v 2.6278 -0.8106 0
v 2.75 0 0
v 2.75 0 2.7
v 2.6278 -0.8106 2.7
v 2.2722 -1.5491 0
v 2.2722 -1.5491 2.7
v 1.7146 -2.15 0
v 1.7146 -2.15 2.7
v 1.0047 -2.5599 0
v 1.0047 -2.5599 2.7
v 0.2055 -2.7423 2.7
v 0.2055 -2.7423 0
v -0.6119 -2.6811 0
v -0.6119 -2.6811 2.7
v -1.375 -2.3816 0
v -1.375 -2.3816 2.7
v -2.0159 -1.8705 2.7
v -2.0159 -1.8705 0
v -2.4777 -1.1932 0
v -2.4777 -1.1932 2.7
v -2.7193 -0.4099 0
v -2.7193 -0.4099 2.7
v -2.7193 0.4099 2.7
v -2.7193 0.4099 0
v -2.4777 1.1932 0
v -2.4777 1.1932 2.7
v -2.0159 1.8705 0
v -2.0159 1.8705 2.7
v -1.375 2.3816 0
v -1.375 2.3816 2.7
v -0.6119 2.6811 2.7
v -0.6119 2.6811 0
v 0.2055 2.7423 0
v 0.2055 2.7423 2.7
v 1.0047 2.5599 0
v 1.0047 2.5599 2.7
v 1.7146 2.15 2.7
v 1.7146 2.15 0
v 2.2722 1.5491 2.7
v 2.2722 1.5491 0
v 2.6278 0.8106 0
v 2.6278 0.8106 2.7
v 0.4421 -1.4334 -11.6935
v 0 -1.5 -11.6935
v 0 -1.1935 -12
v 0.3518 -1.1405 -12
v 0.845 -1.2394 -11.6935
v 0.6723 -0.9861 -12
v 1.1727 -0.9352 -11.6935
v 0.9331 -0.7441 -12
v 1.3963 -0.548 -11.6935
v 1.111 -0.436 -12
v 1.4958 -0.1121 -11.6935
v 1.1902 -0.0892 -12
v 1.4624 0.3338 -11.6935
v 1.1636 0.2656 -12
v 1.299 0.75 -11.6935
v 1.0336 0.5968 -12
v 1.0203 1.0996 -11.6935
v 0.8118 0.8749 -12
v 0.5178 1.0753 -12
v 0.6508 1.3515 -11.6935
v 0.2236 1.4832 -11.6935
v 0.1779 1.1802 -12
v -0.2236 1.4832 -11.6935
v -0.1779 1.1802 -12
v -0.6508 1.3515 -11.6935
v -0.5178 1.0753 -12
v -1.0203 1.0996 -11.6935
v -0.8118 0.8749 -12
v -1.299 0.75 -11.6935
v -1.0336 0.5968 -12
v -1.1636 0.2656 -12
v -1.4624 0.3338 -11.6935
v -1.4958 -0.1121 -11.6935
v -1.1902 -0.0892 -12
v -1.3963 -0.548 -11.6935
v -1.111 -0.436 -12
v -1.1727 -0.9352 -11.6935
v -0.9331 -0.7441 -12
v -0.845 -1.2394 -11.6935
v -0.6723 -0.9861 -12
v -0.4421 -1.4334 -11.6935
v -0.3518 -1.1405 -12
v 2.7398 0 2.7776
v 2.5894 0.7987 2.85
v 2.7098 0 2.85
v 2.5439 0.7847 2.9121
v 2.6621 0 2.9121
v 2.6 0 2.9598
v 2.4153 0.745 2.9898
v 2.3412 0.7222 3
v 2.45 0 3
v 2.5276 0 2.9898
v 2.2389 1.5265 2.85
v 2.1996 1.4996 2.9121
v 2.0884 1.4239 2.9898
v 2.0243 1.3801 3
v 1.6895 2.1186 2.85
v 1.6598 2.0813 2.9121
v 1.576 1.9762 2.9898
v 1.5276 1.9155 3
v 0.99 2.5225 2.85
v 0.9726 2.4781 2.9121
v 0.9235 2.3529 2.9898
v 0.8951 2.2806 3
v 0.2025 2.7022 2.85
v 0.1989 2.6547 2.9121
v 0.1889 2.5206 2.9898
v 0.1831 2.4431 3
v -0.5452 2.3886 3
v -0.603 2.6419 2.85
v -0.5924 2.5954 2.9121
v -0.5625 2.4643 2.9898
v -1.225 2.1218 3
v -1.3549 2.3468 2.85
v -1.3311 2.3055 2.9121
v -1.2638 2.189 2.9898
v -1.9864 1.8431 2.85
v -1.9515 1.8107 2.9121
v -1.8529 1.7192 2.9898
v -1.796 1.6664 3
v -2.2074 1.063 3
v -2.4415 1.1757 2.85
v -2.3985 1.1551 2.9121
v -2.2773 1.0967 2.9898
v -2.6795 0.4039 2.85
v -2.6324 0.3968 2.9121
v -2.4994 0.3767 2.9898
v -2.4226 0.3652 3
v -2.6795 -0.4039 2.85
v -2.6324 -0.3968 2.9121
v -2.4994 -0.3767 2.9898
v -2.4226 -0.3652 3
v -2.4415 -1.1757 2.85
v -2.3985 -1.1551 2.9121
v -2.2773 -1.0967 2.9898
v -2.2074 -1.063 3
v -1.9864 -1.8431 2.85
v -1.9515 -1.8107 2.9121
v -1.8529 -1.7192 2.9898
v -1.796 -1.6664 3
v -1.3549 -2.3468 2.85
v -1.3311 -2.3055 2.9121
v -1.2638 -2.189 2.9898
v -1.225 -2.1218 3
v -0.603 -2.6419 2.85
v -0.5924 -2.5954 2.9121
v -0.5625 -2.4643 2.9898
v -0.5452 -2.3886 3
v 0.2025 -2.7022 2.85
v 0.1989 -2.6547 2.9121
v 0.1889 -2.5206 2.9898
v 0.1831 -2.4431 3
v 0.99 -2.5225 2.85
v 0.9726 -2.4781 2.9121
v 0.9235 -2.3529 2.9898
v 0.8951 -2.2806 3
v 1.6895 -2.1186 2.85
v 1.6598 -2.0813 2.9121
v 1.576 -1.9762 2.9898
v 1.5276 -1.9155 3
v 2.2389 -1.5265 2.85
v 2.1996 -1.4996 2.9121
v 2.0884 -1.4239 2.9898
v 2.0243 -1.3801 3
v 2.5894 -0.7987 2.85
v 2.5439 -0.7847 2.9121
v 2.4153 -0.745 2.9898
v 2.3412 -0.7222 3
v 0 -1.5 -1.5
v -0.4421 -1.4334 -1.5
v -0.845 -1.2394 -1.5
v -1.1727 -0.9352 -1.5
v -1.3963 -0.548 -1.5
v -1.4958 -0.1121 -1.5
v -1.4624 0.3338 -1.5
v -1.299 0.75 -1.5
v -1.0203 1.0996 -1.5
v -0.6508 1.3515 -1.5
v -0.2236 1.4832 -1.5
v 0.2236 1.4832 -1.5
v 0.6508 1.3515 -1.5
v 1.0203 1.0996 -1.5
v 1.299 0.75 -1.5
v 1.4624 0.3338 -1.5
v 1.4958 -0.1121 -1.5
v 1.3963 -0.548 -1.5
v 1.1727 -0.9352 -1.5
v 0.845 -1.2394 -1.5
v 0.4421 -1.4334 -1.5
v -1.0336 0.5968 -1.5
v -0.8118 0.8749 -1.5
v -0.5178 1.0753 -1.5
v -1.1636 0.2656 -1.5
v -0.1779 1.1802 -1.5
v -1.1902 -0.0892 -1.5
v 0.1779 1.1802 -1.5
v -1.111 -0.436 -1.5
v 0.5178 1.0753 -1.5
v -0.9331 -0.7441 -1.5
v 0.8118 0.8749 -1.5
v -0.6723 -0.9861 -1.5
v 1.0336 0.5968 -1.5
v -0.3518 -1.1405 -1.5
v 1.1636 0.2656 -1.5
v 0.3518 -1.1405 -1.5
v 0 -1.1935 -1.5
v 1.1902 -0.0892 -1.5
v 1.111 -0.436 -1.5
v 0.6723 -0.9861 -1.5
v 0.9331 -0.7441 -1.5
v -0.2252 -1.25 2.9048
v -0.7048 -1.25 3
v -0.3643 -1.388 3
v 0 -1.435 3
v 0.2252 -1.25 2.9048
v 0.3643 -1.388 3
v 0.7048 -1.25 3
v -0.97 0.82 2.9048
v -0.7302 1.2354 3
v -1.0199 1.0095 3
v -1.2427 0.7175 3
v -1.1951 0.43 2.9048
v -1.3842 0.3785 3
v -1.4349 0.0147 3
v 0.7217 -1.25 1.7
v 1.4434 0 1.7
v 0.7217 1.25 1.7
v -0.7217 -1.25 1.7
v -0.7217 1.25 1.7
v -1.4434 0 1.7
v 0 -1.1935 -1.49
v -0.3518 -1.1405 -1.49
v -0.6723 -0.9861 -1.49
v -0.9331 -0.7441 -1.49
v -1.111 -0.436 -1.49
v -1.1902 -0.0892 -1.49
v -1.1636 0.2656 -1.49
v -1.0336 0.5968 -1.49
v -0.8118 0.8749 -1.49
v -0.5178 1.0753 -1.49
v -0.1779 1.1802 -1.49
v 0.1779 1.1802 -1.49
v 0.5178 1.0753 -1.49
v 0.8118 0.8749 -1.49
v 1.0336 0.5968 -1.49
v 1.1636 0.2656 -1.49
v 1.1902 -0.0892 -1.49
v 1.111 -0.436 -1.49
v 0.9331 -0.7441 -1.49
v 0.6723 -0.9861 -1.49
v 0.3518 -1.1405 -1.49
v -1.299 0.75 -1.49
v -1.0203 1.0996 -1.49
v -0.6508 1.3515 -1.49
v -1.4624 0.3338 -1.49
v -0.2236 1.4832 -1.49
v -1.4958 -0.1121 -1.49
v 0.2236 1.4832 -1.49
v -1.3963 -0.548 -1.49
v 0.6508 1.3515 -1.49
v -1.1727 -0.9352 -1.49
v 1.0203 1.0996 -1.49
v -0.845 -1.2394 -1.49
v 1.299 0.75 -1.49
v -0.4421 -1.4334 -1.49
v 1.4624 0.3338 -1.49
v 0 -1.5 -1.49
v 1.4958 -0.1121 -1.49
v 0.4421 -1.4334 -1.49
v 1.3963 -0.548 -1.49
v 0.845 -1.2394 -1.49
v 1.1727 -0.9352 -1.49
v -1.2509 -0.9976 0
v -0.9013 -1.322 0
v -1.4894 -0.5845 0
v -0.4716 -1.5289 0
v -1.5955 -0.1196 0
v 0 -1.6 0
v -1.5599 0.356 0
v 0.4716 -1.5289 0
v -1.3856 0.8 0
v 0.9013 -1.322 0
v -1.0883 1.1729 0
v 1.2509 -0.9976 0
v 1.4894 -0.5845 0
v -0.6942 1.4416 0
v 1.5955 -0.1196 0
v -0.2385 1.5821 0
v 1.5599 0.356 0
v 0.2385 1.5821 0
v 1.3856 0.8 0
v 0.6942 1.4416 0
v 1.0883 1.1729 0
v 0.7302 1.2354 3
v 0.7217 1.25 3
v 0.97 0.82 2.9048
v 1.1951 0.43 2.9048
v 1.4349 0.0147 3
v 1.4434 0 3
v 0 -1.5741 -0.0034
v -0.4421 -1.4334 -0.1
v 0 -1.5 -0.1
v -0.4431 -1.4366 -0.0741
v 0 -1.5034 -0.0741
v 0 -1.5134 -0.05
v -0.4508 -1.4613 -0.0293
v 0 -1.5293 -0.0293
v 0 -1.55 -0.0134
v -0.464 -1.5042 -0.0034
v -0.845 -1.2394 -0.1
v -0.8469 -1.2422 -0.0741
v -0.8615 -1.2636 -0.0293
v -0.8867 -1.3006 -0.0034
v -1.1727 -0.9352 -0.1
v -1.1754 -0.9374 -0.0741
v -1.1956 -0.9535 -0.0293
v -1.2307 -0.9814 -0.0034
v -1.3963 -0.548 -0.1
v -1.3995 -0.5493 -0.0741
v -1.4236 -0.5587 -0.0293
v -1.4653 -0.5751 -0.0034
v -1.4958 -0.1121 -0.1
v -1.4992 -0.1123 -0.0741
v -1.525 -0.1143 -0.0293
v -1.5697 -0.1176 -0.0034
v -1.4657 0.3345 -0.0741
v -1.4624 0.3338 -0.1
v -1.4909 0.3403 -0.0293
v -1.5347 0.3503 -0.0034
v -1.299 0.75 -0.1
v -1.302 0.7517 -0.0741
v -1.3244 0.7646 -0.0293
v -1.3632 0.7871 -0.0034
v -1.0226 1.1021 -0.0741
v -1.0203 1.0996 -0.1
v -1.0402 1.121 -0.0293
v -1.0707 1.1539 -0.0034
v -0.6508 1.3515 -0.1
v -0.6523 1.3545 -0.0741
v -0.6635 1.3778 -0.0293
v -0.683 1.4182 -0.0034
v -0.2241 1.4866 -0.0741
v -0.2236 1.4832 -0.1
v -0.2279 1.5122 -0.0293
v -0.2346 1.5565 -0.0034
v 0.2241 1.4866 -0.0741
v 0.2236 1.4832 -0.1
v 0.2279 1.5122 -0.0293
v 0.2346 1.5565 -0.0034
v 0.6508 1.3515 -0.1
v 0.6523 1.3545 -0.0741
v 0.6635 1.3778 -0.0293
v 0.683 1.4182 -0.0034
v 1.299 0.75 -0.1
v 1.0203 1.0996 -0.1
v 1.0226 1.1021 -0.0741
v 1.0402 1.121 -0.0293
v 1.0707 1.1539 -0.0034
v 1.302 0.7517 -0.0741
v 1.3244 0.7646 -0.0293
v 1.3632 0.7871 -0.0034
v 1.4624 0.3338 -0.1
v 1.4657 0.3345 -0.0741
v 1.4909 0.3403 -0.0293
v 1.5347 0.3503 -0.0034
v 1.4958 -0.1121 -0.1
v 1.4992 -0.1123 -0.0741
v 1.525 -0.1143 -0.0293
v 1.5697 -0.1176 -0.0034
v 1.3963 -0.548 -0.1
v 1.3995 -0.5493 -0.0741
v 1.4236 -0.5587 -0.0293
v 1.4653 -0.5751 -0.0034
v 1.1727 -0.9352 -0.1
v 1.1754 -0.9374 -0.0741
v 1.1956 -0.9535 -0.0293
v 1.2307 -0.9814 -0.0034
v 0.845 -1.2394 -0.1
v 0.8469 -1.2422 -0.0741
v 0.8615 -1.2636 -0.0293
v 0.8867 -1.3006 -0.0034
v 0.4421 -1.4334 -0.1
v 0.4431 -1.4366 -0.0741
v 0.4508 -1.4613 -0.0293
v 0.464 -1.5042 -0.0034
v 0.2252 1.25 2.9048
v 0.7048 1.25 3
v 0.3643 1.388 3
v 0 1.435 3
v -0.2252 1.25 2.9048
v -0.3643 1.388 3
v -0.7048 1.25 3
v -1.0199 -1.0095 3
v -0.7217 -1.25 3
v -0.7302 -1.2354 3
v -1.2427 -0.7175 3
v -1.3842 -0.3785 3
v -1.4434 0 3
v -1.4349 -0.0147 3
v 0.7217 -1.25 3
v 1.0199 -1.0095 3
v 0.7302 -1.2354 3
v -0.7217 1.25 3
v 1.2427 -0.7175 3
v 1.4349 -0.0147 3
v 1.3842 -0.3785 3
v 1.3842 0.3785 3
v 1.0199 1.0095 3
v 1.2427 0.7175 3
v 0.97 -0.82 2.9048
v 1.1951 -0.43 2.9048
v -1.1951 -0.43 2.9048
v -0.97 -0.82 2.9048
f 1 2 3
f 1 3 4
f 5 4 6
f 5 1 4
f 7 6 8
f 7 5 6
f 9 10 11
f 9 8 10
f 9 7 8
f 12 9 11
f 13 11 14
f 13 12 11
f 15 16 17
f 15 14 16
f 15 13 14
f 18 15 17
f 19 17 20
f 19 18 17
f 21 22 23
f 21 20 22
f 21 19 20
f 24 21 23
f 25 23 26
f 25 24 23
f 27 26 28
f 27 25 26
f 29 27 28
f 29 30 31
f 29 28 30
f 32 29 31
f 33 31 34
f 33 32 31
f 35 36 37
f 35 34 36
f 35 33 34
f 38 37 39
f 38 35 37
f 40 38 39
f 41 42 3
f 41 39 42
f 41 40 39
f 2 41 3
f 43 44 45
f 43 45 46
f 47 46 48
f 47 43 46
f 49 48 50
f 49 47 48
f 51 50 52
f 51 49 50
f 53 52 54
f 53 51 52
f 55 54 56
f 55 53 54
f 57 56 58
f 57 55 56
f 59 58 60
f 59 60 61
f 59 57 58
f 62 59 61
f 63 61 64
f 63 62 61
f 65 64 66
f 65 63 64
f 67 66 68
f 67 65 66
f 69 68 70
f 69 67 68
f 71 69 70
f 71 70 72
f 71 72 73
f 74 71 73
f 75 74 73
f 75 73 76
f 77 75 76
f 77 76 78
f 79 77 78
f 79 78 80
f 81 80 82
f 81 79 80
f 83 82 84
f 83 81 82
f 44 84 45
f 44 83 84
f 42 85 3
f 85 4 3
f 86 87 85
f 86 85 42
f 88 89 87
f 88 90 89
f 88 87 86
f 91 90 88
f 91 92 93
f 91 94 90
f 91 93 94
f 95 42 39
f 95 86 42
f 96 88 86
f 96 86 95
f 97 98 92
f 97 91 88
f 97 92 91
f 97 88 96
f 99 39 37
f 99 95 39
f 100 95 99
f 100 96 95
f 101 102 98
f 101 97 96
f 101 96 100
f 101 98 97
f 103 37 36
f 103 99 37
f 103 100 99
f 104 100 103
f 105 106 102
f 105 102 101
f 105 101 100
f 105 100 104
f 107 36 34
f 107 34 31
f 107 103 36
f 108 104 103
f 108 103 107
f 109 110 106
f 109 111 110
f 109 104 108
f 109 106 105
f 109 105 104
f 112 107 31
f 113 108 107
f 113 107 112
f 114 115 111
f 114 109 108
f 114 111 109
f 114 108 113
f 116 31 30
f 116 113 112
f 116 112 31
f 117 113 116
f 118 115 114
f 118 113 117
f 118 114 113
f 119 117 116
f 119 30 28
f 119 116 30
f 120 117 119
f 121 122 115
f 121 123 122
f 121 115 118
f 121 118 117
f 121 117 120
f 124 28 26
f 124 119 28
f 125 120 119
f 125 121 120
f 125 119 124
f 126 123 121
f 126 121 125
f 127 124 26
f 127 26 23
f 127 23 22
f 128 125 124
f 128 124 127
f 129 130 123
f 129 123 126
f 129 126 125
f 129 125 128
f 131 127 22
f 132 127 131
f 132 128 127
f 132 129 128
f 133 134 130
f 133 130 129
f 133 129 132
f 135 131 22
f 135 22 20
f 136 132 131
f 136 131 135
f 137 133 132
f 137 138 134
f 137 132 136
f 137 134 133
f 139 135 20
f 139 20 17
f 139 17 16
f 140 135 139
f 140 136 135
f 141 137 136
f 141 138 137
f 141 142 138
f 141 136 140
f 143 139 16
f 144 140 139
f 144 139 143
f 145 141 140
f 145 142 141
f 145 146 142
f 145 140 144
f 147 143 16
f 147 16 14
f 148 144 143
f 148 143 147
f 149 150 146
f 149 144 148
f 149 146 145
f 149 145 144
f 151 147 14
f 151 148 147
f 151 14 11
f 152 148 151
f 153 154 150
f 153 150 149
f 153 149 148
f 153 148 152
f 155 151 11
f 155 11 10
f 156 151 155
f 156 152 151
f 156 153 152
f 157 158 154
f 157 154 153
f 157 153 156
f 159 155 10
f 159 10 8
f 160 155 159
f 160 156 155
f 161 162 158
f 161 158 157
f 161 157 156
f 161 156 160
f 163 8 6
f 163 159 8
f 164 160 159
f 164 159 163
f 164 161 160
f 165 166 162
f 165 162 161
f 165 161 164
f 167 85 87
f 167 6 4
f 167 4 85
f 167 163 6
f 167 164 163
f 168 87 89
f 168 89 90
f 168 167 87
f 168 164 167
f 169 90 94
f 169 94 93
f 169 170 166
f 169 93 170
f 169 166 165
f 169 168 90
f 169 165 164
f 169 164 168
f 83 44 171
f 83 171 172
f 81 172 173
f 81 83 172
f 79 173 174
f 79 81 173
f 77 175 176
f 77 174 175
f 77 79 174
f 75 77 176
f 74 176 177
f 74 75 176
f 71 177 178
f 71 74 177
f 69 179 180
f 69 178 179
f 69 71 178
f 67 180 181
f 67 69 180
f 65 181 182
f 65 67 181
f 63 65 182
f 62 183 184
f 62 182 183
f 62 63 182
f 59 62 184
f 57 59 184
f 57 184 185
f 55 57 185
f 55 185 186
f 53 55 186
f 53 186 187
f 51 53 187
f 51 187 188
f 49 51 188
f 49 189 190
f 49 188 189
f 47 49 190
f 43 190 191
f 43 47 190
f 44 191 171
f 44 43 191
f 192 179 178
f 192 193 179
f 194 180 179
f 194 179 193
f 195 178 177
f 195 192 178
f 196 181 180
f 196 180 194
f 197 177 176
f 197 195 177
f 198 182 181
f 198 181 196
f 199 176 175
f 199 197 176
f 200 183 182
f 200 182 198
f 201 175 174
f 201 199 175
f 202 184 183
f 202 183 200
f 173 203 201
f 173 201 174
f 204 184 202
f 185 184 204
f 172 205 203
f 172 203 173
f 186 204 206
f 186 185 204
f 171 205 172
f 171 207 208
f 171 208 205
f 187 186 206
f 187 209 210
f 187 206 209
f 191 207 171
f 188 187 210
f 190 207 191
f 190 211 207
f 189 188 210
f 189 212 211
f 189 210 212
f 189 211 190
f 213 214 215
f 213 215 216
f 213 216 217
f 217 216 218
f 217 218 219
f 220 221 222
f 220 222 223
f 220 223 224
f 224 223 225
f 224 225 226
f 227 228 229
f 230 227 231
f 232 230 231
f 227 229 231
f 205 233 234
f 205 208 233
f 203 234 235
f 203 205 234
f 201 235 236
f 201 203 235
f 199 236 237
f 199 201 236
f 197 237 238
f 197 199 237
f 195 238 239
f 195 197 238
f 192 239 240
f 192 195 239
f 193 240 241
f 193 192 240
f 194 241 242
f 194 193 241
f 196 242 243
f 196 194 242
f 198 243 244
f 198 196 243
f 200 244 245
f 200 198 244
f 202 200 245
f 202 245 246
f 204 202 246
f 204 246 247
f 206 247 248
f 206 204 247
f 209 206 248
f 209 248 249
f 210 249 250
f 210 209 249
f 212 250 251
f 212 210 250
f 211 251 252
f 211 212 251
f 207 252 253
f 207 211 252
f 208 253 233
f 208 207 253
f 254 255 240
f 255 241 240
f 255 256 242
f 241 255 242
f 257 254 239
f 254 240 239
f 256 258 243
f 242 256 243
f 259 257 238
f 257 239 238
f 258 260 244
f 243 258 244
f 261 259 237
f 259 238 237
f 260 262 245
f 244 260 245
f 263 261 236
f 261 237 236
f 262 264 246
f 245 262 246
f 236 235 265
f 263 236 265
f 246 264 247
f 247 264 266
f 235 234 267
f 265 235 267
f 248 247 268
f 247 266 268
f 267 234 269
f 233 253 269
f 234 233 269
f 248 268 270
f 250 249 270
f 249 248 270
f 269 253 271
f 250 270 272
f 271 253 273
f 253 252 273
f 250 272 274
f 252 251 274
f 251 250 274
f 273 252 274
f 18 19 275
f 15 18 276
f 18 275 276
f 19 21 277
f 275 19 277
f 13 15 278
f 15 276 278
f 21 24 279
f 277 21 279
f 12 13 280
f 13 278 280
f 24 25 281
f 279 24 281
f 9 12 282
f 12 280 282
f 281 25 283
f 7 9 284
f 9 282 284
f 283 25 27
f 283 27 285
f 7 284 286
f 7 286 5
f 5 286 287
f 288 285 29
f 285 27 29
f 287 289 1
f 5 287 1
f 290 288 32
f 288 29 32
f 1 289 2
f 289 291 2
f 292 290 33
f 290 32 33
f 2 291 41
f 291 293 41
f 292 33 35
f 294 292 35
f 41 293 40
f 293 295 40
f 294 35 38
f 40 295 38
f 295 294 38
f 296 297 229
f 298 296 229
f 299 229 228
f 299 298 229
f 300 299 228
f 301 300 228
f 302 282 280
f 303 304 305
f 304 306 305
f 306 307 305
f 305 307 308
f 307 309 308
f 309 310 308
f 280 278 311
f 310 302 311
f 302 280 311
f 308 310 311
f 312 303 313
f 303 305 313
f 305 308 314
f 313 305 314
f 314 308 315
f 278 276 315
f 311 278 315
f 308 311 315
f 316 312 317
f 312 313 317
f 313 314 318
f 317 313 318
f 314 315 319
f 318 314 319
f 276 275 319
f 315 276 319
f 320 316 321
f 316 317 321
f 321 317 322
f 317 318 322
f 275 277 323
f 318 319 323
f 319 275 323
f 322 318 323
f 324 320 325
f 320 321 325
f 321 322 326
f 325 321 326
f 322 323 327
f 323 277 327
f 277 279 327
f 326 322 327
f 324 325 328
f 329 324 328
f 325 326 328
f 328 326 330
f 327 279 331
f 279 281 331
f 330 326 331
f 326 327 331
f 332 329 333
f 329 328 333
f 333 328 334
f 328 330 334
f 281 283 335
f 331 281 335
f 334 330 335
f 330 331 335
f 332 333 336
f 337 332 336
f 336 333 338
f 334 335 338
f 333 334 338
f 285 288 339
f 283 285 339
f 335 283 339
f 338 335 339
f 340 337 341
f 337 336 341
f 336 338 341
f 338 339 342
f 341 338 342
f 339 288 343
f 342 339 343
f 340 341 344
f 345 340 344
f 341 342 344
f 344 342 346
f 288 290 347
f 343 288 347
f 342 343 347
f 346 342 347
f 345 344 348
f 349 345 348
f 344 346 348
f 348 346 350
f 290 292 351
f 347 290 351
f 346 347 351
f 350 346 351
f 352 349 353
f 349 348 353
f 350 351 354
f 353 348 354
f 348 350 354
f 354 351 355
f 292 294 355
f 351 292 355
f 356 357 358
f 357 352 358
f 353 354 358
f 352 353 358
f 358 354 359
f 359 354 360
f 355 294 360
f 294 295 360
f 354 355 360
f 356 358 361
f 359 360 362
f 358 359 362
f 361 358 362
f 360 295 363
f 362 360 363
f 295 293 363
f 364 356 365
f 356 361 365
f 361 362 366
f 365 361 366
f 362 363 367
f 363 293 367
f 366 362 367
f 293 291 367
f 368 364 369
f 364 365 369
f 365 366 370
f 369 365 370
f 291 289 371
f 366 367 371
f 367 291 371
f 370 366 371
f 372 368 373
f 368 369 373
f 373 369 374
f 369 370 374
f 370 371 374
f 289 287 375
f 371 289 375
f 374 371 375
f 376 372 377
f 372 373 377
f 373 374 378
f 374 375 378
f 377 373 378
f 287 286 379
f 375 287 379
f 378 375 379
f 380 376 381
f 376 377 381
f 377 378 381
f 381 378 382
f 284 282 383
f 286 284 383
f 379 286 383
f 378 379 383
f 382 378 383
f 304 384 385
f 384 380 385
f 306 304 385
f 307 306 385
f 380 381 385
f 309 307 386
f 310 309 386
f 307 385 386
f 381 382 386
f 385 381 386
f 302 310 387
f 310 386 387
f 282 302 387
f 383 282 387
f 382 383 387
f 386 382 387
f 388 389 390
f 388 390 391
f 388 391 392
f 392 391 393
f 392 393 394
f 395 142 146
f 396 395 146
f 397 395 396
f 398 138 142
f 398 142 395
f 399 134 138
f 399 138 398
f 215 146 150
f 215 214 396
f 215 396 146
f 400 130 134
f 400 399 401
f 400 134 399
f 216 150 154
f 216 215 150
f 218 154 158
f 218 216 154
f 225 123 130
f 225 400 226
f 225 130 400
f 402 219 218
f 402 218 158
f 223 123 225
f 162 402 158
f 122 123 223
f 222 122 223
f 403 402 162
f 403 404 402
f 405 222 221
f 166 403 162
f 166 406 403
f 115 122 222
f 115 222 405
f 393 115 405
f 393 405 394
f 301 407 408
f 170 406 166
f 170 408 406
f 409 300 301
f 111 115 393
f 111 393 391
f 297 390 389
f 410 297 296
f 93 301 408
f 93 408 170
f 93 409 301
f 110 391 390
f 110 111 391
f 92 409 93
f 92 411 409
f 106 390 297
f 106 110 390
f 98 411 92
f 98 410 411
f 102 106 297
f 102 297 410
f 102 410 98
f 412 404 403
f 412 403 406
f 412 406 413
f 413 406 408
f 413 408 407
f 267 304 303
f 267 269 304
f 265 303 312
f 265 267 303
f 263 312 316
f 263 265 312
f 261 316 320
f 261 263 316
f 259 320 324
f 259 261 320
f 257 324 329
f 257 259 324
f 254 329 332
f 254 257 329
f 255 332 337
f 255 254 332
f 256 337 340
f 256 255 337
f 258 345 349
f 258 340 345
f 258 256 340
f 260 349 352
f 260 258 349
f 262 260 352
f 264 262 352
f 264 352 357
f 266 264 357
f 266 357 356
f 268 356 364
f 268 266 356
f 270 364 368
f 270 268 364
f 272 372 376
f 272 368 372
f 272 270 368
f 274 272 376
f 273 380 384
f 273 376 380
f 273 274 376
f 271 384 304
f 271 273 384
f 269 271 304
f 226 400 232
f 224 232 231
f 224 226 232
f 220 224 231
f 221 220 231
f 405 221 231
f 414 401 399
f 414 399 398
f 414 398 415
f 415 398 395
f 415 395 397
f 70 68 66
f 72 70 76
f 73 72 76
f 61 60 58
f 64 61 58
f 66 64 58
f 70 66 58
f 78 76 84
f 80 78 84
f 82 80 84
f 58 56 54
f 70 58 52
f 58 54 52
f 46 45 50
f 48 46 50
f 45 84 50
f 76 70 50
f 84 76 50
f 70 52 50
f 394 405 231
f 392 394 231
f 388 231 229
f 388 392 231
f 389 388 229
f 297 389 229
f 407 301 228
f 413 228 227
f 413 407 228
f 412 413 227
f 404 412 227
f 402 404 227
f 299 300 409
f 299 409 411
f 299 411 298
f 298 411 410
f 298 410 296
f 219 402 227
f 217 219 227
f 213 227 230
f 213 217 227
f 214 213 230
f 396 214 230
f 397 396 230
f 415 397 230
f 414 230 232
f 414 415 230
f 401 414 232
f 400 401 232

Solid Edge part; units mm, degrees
sketch "Sketch1" plane through (0, 0, 0) normal (0, 0, 1) x (1, 0, 0)
  circle A0 centre (0, 0) radius 2.75
extrude "Protrusion1" add sketch "Sketch1" along normal blind 3
sketch "Sketch2" plane through (0, 0, 3) normal (0, 0, 1) x (0, 1, 0)
  line L0 (0, 1.4434) -> (1.25, 0.7217)
  line L1 (1.25, 0.7217) -> (1.25, -0.7217)
  line L2 (1.25, -0.7217) -> (0, -1.4434)
  line L3 (0, -1.4434) -> (-1.25, -0.7217)
  line L4 (-1.25, -0.7217) -> (-1.25, 0.7217)
  line L5 (-1.25, 0.7217) -> (0, 1.4434)
extrude "Cutout1" cut sketch "Sketch2" against normal blind 1.3
fillet "Round1" radius 0.3 1 edges at (-2.75, 0, 3)
sketch "Sketch3" plane through (0, 0, 0) normal (1, 0, 0) x (0, 1, 0)
  line L0 (-1.1935, -12) -> (0, -12)
  line L1 (-1.5, -11.6935) -> (-1.1935, -12)
  line L2 (-1.5, -1.5) -> (-1.5, -11.6935)
  line L3 (-1.1935, -1.5) -> (-1.5, -1.5)
  line L4 (-1.1935, -1.49) -> (-1.1935, -1.5)
  line L5 (-1.5, -1.49) -> (-1.1935, -1.49)
  line L6 (-1.5, -0.1) -> (-1.5, -1.49)
  arc A0 (-1.5, -0.1) -> (-1.6, 0) centre (-1.6, -0.1) ccw
  dimension "D1" = 1.5
  dimension "D2" = 0.01
  dimension "D3" = 0.1
  dimension "D4" = 12
revolve "RevolvedProtrusion1" add sketch "Sketch3" angle 360 about axis through (0, 0, -60.325) along (0, 0, 1) material side at (0, -0.5968, -11.95)
cosmetic_thread "Thread1"
sketch "Sketch4" plane through (0, 0, 0) normal (0, -1, 0) x (1, 0, 0)
  line L0 (-1.435, 3) -> (0, 2.1715)
revolve "RevolvedCutout1" cut sketch "Sketch4" angle 360 about axis through (0, 0, 57.15) along (0, 0, -1) material side at (-0.6925, 0, 2.6291)
properties material "Steel"
